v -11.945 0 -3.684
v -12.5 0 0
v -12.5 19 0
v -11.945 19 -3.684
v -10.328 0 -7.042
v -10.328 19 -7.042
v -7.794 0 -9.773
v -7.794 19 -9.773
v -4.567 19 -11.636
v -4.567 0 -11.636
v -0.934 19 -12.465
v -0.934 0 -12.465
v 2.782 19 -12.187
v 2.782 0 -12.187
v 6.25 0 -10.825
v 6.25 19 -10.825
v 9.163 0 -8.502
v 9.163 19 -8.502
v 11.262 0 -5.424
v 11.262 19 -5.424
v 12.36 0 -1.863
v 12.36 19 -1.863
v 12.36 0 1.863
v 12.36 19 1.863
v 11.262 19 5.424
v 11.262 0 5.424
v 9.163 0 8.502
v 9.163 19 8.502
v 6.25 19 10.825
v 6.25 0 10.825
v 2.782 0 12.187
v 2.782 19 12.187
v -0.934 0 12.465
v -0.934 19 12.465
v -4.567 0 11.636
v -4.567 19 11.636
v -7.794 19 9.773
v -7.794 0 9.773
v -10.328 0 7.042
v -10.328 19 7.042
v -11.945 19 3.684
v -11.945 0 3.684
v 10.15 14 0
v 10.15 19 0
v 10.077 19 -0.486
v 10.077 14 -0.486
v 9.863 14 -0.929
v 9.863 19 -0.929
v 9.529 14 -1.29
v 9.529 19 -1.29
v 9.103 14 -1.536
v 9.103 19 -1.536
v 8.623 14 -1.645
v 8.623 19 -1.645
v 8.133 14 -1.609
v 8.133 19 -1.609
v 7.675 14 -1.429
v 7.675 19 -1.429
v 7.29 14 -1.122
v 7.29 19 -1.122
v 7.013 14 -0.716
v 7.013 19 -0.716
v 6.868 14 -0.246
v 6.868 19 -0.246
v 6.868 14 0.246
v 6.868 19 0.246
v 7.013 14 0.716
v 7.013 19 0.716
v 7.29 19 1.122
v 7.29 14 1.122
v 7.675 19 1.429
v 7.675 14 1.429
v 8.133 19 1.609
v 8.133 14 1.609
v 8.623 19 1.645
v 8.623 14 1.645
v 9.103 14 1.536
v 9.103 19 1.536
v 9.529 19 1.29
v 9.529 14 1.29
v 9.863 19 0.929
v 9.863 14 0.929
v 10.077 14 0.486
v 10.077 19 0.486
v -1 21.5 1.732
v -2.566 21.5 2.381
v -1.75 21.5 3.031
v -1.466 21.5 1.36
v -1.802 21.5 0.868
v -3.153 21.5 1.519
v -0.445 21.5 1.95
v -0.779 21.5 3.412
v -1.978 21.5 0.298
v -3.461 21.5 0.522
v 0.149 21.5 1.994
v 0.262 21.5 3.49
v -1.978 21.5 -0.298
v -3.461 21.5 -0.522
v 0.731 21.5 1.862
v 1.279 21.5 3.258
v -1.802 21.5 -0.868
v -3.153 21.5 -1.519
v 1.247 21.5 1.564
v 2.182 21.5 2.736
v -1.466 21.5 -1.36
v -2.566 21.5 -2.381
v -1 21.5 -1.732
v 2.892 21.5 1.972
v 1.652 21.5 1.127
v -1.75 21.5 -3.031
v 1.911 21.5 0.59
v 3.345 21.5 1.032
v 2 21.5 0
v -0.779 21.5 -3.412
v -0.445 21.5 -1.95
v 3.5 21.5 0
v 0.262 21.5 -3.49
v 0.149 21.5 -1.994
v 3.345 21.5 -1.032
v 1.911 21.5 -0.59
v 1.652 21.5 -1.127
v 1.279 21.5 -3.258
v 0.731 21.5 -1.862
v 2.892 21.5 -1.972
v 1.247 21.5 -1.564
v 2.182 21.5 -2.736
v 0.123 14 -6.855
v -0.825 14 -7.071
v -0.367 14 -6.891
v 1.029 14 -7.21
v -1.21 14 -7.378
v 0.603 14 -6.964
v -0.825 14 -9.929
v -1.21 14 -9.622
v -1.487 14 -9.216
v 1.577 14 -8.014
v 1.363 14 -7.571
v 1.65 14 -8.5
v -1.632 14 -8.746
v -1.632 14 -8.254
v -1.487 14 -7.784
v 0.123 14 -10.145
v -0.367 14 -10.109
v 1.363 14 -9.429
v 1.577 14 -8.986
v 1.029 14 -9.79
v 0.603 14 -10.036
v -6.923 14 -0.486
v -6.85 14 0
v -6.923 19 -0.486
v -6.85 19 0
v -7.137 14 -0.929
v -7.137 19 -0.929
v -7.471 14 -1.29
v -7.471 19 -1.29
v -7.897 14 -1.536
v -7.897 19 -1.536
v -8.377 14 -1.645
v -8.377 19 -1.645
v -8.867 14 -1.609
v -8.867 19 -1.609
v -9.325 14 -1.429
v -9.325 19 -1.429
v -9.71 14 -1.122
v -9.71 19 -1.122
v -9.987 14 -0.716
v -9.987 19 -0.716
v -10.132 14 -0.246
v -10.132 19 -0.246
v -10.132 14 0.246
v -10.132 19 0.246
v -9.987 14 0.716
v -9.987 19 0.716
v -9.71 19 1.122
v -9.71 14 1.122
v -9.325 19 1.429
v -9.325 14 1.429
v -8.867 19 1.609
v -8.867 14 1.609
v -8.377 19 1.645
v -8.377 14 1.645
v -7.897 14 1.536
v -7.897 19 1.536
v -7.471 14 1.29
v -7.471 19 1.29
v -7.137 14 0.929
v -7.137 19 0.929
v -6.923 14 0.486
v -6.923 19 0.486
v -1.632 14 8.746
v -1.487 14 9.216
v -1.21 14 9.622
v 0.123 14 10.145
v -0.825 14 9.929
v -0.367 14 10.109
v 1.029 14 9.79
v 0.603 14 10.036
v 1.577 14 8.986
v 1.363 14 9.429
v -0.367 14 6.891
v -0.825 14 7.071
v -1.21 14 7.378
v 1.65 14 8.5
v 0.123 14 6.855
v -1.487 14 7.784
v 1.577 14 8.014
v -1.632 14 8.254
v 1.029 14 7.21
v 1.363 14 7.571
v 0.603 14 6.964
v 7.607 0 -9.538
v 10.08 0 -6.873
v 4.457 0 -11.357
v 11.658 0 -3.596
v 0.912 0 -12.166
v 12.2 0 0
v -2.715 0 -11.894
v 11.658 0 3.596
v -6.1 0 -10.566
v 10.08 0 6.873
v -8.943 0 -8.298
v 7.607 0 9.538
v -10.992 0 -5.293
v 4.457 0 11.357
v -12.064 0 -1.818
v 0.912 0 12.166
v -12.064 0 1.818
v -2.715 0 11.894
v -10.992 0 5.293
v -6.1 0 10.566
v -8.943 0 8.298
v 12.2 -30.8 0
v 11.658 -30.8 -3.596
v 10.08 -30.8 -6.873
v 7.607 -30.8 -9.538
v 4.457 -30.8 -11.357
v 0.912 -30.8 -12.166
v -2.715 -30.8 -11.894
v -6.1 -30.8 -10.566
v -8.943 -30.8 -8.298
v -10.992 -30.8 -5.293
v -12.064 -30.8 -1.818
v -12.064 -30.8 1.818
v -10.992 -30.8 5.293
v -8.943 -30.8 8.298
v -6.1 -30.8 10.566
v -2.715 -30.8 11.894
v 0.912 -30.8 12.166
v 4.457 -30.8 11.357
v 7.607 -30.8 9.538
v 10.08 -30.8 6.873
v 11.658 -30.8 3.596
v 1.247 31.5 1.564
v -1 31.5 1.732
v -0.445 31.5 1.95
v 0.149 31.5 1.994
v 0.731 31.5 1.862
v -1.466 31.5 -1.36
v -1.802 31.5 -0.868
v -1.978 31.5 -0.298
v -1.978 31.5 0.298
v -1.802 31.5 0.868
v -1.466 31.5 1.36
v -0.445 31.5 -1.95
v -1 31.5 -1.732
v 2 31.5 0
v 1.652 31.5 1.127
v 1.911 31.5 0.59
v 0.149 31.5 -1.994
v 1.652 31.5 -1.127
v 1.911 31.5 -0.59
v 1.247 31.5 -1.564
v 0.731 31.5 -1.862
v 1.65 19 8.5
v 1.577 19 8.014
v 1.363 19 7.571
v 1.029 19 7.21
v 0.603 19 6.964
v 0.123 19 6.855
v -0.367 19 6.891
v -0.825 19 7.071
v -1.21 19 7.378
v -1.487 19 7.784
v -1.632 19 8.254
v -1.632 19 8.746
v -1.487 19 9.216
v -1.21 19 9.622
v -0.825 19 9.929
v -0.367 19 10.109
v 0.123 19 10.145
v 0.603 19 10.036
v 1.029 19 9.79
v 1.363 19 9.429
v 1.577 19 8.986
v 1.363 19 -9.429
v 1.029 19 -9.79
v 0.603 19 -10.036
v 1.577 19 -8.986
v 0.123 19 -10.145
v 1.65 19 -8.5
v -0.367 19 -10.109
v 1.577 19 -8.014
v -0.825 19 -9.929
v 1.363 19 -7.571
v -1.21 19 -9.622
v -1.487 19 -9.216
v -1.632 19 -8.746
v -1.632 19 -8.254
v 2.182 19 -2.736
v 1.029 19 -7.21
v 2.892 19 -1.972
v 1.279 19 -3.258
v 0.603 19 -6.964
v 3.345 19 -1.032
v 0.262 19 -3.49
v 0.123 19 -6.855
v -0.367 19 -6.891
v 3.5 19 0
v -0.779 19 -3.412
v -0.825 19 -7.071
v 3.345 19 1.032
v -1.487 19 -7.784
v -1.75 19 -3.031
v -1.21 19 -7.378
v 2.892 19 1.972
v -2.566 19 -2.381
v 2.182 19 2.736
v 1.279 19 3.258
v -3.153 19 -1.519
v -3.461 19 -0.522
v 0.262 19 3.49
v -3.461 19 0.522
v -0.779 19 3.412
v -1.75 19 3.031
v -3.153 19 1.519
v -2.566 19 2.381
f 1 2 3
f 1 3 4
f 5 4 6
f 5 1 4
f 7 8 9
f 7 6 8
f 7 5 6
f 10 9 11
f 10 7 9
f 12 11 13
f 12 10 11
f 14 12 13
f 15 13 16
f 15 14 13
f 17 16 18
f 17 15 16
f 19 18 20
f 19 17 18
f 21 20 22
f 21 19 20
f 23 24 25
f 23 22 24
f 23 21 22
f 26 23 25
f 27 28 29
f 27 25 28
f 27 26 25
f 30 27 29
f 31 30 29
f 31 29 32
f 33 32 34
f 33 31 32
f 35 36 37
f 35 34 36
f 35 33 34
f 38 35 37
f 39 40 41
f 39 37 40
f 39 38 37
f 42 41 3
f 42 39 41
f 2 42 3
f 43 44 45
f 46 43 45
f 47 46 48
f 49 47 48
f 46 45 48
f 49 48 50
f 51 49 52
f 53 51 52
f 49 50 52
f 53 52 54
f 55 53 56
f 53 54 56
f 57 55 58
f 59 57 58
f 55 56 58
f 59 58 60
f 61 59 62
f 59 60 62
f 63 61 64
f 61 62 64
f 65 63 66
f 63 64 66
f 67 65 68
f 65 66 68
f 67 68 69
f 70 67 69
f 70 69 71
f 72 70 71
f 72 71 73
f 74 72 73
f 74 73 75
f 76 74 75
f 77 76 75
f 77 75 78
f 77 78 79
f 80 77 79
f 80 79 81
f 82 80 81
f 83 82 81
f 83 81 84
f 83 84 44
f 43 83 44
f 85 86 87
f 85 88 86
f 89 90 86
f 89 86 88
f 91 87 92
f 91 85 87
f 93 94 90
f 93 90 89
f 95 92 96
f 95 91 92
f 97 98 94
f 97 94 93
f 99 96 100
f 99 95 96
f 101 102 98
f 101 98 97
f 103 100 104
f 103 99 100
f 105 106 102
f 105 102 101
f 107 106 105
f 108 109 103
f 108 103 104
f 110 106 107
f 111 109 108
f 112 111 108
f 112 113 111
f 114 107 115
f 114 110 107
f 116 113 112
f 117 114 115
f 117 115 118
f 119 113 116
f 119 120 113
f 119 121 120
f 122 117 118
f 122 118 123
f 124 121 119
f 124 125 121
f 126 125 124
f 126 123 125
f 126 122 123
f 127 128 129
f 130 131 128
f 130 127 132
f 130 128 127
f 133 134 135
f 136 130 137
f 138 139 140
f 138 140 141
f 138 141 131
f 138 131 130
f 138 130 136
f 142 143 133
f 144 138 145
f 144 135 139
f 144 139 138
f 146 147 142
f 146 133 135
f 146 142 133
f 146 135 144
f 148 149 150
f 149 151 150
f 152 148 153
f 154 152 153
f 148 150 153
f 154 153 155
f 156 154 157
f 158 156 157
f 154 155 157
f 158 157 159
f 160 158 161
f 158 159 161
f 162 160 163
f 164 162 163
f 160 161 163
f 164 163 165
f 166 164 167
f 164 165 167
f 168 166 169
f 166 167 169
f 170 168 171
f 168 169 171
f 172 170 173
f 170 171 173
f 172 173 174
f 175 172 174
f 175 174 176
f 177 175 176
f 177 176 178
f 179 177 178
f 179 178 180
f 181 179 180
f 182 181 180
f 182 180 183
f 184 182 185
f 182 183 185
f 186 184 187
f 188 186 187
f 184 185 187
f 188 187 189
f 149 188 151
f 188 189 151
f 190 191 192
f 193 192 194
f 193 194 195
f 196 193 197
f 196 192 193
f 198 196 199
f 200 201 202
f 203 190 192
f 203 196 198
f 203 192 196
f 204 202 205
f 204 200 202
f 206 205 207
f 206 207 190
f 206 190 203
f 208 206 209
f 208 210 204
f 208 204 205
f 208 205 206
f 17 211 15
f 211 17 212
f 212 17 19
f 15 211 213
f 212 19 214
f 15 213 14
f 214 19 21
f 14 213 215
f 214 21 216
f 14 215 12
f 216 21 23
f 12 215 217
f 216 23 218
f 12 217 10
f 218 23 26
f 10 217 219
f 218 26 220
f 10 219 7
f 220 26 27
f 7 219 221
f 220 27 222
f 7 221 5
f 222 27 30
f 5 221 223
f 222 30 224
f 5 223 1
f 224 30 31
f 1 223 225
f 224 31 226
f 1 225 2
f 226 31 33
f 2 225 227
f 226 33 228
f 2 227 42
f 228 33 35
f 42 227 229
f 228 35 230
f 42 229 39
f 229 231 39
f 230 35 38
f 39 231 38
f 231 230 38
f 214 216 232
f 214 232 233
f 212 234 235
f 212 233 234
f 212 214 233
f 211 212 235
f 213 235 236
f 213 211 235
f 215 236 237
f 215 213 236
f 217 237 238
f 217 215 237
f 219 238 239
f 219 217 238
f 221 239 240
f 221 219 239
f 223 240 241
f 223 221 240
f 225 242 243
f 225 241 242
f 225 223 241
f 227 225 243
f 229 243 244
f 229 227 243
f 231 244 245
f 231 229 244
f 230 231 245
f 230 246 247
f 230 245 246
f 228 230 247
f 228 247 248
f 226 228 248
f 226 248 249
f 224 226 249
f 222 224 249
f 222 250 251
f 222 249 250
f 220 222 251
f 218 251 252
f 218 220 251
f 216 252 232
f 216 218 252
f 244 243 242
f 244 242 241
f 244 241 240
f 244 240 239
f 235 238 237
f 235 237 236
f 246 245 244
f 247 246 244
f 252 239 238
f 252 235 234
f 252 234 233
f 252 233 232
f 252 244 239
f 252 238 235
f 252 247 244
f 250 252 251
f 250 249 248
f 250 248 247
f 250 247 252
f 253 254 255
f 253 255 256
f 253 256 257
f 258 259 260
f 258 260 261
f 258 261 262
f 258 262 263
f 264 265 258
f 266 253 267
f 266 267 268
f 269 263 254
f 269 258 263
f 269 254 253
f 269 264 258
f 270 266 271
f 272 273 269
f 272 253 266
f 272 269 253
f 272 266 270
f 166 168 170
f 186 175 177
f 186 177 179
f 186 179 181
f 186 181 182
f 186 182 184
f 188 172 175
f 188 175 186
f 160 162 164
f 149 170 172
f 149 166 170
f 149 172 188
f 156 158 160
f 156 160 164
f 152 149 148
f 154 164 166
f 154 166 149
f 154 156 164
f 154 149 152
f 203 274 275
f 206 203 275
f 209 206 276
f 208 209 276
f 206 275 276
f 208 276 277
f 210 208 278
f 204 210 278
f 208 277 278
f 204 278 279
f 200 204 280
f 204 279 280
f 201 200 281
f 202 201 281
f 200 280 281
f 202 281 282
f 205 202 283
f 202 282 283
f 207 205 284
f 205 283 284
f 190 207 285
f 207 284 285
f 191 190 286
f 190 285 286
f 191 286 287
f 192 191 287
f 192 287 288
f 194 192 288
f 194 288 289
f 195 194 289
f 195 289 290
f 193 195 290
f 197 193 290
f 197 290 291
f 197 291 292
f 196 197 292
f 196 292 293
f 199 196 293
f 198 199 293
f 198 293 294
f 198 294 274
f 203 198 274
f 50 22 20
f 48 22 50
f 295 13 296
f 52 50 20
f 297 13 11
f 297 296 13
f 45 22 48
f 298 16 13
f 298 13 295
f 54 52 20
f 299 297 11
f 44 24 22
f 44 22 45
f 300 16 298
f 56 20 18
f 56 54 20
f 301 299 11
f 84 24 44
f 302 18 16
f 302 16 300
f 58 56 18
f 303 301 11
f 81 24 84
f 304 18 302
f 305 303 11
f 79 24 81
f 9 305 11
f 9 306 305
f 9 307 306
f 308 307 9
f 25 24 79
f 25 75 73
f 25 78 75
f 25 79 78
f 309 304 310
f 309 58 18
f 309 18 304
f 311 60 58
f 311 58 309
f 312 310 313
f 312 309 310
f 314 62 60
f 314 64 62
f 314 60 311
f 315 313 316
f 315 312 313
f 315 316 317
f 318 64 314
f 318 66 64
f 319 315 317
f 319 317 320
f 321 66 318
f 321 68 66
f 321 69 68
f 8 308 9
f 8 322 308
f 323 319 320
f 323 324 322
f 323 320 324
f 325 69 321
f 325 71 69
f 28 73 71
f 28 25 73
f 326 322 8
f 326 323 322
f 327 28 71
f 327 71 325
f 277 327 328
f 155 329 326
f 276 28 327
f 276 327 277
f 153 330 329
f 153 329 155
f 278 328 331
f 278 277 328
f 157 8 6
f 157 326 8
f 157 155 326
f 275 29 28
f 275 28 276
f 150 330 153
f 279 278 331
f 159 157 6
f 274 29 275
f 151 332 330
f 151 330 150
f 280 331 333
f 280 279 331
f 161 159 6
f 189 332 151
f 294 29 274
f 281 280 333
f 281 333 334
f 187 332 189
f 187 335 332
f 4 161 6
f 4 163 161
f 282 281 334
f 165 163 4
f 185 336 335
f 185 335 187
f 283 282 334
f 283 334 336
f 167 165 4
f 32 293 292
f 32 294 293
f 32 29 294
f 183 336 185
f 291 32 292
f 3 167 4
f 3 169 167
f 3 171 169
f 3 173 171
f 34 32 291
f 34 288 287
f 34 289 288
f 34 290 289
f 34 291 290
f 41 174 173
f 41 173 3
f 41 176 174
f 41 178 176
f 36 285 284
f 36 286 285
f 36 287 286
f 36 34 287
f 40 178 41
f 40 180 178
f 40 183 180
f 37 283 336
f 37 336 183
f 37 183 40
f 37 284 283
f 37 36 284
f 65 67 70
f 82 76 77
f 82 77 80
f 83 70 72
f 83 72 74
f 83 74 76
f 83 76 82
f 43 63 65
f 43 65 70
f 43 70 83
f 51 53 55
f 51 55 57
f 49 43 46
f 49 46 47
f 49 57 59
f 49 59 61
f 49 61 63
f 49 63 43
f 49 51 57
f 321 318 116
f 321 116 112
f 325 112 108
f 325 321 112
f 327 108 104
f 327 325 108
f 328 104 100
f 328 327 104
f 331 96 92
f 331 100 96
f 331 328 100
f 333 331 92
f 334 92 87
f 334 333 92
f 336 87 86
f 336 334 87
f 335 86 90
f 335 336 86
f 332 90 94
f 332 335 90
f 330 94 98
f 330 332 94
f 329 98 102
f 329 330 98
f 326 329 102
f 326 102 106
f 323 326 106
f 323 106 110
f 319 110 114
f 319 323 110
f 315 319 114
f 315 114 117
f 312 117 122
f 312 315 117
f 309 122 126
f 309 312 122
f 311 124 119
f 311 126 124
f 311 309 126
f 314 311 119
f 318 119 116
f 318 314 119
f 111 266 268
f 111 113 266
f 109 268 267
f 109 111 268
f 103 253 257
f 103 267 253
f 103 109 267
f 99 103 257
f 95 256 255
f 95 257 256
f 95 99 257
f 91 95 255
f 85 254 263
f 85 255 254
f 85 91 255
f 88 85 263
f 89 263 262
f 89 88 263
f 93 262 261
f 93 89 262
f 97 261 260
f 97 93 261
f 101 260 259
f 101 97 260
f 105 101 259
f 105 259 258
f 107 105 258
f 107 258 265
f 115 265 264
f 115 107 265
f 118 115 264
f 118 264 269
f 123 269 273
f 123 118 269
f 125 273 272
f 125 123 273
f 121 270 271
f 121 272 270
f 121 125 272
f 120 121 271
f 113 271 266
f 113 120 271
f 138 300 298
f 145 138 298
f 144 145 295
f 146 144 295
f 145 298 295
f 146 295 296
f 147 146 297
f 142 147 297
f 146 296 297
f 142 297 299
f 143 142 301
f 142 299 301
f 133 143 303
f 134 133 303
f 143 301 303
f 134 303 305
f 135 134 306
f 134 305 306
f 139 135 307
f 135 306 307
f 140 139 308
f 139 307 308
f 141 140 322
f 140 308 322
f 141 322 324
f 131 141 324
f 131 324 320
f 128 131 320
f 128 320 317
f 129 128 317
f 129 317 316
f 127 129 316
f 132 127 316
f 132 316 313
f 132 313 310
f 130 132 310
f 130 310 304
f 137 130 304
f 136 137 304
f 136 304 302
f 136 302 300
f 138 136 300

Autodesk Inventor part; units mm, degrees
ref_plane "YZ Plane" through (0, 0, 0) normal (1, 0, 0) x (0, 1, 0)
ref_plane "XZ Plane" through (0, 0, 0) normal (0, 1, 0) x (-1, 0, 0)
ref_plane "XY Plane" through (0, 0, 0) normal (0, 0, 1) x (1, 0, 0)
sketch "Sketch1" plane through (0, 0, 0) normal (0, 1, 0) x (-1, 0, 0)
  circle A0 centre (0, 0) radius 12.5
  dimension "d0" = 25
extrude "Extrusion1" add sketch "Sketch1" along normal blind 19
sketch "Sketch2" plane through (0, 0, 0) normal (0, -1, 0) x (1, 0, 0)
  circle A0 centre (0, 0) radius 12.2
  dimension "d3" = 24.4
extrude "Extrusion2" add sketch "Sketch2" along normal blind 30.8
sketch "Sketch3" plane through (0, 19, 0) normal (0, 1, 0) x (1, 0, 0)
  circle A0 centre (0, 0) radius 3.5
  dimension "d6" = 7
extrude "Extrusion3" add sketch "Sketch3" along normal blind 2.5
sketch "Sketch4" plane through (0, 21.5, 0) normal (0, 1, 0) x (1, 0, 0)
  circle A0 centre (0, 0) radius 3.5 projected
  circle A1 centre (0, 0) radius 2
  dimension "d9" = 4
extrude "Extrusion4" add sketch "Sketch4" along normal blind 10 contours A1
sketch "Sketch5" plane through (0, 19, 0) normal (0, 1, 0) x (1, 0, 0)
  circle A0 centre (0, 8.5) radius 1.65
  circle A1 centre (-8.5, 0) radius 1.65
  circle A2 centre (0, -8.5) radius 1.65
  circle A3 centre (8.5, 0) radius 1.65
  point P0 (0, 0)
  dimension "d13" = 3.3
  dimension "d16" = 360
extrude "Extrusion5" cut sketch "Sketch5" against normal blind 5
properties part number "Motor" material "Iron, Malleable"
